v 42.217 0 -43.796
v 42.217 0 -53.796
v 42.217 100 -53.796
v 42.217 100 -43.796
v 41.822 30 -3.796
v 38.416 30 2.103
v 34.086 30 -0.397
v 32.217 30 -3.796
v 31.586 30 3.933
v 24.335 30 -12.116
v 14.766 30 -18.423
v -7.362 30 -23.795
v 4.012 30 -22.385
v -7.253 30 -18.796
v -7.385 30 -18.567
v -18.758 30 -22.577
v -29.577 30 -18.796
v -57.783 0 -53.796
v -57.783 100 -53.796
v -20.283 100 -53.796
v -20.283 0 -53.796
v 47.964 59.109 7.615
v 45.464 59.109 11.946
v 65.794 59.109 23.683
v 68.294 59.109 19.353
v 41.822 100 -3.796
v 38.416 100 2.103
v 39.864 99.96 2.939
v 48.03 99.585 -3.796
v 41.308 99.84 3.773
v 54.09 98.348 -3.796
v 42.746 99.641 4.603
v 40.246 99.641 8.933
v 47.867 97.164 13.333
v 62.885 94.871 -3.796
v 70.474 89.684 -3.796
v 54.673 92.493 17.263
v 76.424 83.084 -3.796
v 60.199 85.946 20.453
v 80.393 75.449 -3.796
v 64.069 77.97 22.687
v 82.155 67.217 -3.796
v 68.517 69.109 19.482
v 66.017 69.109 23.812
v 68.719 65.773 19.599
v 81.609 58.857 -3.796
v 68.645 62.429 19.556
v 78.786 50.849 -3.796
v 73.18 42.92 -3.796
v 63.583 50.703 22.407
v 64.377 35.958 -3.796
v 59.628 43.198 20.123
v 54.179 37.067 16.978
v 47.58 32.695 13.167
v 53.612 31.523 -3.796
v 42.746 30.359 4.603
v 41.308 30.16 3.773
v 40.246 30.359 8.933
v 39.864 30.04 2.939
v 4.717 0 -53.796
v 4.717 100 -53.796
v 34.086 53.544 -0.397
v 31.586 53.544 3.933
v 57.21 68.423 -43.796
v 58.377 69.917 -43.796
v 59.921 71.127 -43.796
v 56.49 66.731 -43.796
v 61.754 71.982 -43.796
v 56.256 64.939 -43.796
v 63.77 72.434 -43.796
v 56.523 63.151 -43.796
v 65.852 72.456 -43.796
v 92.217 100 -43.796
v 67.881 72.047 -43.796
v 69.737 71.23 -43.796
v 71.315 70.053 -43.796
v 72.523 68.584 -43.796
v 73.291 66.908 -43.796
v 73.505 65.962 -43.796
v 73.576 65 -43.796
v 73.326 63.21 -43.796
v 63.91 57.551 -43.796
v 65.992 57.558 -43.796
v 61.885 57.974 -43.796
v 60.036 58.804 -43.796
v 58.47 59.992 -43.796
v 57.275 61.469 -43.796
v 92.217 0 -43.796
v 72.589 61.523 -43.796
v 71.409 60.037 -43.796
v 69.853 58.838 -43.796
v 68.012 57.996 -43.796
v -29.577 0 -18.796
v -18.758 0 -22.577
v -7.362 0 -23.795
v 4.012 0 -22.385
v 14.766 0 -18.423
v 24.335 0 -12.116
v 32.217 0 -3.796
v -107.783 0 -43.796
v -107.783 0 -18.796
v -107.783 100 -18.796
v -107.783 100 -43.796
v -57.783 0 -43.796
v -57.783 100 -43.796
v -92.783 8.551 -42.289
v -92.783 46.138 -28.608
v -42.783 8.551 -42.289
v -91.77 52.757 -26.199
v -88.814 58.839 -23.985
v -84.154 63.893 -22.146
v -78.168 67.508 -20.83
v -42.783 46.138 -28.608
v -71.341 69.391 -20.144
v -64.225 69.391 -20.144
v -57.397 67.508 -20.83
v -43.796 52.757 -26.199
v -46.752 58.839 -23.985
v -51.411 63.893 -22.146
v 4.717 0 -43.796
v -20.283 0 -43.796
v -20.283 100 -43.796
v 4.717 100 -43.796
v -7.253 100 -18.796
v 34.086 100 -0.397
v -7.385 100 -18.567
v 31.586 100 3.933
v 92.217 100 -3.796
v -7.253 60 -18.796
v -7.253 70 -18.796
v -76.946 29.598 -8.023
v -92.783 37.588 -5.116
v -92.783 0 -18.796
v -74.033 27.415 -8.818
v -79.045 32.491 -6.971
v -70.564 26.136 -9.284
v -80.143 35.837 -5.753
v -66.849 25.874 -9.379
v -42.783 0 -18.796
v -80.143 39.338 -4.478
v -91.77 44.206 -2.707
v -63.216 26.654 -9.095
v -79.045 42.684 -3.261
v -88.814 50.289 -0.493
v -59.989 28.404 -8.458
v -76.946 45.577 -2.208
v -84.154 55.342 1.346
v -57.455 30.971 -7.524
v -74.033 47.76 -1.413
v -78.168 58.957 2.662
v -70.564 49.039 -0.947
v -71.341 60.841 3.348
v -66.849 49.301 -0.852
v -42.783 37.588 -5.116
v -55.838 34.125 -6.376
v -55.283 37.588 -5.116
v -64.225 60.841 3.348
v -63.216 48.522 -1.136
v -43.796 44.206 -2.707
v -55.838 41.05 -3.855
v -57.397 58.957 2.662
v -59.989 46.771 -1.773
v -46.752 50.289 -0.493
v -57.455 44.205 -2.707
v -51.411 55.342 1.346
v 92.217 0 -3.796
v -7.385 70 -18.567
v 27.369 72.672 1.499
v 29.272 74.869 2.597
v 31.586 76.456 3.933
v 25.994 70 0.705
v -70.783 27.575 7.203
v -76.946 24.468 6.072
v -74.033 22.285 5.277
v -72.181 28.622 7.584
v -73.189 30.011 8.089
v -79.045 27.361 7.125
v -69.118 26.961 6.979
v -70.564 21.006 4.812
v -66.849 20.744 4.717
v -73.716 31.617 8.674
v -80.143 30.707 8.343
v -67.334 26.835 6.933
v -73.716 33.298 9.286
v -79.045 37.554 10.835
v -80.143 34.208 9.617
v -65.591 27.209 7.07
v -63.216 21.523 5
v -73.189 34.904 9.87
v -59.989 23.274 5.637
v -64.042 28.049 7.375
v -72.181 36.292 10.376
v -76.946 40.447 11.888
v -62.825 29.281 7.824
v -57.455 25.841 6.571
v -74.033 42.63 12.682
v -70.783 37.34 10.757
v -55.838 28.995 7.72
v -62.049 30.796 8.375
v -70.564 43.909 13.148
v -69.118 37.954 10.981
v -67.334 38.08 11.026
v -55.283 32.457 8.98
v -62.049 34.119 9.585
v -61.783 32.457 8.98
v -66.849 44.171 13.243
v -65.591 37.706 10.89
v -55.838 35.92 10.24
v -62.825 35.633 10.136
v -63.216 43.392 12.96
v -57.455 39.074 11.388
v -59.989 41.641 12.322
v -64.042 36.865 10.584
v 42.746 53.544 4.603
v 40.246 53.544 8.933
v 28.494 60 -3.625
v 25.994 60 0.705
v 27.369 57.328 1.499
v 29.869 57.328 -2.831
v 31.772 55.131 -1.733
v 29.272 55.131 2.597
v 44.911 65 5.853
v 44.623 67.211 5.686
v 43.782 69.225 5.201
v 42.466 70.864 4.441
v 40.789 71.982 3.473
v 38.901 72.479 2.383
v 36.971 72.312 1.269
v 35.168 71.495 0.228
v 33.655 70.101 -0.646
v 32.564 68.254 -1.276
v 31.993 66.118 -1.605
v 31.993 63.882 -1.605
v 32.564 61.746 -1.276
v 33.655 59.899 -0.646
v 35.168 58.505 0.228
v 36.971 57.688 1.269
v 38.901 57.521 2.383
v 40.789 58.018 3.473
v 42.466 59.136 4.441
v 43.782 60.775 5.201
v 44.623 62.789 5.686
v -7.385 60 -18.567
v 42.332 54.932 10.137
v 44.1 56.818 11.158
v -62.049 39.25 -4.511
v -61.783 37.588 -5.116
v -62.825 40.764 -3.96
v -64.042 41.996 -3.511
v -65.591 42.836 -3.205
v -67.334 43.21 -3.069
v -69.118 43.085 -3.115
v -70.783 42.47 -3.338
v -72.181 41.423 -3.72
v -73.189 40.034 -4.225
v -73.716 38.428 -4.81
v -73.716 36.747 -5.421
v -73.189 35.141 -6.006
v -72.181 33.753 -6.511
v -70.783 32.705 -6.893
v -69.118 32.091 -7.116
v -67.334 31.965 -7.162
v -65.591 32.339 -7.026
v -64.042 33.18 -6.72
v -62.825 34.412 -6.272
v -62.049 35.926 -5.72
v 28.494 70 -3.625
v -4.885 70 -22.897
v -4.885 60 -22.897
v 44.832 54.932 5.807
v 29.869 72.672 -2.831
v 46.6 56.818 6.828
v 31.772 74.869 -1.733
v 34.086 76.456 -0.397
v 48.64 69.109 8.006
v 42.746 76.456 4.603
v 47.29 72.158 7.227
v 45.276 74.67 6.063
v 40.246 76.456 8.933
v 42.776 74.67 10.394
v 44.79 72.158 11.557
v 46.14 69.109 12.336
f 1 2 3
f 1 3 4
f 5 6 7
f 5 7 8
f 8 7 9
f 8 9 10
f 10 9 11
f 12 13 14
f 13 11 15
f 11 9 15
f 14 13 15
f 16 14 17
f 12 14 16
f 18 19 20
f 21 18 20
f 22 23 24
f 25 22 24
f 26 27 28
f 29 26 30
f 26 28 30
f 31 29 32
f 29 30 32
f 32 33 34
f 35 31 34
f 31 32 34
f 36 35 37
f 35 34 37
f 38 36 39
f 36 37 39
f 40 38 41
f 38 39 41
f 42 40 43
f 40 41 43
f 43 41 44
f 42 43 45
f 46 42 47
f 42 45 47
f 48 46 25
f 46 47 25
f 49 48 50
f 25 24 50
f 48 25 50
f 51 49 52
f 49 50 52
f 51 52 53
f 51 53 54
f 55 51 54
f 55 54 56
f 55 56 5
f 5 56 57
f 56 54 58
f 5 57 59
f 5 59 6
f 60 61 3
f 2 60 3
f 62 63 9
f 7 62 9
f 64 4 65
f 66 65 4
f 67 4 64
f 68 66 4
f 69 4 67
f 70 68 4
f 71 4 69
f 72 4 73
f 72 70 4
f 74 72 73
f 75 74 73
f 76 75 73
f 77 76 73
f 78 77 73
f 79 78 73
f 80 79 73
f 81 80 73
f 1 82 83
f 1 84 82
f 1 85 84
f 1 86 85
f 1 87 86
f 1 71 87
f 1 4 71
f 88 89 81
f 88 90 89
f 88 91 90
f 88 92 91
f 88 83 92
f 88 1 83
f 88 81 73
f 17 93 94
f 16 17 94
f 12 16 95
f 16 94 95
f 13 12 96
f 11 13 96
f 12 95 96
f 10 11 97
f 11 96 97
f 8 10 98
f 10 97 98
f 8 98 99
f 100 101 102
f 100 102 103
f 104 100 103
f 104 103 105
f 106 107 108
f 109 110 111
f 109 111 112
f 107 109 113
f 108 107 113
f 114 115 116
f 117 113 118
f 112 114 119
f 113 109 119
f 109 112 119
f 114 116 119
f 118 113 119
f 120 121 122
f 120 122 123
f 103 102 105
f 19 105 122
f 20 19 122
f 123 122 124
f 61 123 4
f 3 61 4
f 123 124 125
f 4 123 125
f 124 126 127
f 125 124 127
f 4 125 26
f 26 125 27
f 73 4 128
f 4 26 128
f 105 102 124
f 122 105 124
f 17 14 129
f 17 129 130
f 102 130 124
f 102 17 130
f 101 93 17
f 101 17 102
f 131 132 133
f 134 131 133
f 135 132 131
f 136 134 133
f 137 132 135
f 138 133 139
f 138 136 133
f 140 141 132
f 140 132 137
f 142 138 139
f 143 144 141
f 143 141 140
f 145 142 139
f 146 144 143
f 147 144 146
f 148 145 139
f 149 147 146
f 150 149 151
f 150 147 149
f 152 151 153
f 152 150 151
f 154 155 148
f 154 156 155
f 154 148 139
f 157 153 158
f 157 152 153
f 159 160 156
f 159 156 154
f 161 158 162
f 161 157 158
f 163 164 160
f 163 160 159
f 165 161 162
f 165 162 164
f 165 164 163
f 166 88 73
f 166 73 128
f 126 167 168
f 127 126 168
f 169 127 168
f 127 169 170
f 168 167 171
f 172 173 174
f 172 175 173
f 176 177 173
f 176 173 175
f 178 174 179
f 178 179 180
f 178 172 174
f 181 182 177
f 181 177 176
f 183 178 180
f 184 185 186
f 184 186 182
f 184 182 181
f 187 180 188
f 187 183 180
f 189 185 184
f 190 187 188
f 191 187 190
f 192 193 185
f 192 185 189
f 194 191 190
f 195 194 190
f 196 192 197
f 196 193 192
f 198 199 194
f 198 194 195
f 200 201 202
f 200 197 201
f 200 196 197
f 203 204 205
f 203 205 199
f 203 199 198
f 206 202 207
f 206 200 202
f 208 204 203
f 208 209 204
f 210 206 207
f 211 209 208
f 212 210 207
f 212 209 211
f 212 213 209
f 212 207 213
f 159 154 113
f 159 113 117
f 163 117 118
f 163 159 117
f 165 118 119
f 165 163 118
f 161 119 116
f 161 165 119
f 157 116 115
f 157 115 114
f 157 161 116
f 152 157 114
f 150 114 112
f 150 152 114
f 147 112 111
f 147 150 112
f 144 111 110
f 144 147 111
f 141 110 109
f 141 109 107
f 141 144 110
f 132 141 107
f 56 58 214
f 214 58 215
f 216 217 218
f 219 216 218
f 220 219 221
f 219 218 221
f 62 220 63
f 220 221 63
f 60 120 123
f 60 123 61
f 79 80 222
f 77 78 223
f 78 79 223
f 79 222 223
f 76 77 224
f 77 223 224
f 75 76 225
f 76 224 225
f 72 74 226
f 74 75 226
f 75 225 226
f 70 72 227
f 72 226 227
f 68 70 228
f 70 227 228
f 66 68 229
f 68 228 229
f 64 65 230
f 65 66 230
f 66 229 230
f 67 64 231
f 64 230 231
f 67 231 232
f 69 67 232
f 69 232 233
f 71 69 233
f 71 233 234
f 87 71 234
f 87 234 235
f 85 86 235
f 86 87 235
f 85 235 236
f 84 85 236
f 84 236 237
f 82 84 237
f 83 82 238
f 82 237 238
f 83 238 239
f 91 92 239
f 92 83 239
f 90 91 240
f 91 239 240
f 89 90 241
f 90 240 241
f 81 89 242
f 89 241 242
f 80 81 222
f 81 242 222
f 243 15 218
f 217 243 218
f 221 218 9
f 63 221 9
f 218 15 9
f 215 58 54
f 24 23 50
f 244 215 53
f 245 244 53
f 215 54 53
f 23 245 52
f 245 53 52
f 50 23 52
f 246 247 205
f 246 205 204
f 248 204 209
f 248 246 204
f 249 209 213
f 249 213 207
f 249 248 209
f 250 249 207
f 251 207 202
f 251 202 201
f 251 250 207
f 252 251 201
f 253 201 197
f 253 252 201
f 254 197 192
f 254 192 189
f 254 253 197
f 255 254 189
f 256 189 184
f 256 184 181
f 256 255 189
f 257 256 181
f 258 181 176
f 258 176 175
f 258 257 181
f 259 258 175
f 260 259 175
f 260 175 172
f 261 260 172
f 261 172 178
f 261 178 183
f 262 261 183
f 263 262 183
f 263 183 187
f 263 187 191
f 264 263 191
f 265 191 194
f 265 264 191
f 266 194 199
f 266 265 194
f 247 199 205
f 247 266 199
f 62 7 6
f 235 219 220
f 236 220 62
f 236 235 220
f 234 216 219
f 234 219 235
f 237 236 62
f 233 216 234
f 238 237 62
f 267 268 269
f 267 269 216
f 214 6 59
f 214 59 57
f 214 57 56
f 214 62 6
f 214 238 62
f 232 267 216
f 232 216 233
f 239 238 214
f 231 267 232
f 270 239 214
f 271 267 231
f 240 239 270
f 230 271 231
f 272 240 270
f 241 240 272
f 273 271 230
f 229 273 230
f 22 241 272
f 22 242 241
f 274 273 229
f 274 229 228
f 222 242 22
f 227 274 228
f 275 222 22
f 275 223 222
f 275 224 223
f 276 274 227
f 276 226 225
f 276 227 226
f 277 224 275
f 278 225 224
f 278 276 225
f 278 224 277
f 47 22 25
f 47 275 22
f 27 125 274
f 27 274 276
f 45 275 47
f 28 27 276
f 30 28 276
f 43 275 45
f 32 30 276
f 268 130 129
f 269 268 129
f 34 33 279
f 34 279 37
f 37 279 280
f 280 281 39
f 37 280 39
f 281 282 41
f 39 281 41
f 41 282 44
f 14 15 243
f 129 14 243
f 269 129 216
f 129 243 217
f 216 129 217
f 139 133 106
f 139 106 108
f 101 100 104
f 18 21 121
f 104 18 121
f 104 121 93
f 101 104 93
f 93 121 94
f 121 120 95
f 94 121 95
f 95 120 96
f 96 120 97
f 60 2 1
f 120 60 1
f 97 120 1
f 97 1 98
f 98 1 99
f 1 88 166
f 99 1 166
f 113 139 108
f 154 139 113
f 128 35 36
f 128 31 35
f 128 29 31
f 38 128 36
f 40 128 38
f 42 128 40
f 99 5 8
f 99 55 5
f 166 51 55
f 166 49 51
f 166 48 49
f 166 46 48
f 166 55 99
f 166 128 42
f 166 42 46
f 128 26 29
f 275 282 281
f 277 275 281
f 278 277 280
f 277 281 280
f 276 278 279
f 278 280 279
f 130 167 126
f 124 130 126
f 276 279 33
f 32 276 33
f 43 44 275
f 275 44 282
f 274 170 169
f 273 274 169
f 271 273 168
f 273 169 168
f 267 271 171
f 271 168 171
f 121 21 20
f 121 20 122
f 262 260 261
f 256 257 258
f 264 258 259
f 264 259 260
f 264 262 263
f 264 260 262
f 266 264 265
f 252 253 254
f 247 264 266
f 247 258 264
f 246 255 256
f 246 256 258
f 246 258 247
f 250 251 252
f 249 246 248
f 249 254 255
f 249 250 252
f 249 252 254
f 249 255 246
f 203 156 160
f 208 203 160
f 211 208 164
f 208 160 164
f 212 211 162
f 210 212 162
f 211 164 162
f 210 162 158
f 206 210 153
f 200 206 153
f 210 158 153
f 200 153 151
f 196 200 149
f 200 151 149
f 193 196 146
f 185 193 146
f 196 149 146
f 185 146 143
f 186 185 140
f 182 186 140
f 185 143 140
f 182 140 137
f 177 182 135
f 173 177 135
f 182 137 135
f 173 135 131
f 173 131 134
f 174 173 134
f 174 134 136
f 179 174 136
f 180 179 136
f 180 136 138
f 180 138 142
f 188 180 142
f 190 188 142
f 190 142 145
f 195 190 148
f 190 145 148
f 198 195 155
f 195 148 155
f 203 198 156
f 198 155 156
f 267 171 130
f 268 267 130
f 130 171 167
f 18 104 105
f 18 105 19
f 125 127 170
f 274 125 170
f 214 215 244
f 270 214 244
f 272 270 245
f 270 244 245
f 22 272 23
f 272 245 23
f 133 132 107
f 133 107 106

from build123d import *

# Parameters (mm, degrees)
F1_DEPTH  = 100
F4_DEPTH  = 25
F5_R      = 12.5
F5_R_2    = 6
F6_DEPTH  = 15
F11_R     = 7.5
F12_DEPTH = 80.3118891325
F14_DEPTH = 5
F15_W     = 30
F15_H     = 15
F16_DEPTH = 25
F17_R     = 50
F18_DEPTH = 30


with BuildPart() as f1:
    # F0 (on Front) → F1 (new body)
    with BuildSketch(Plane.XZ):
        Polygon((92.2171346843, -3.7963638455), (32.2171346843, -3.7963638455), (32.2171346843, -18.7963638455), (-107.7828653157, -18.7963638455), (-107.7828653157, -43.7963638455), (-57.7828653157, -43.7963638455), (-57.7828653157, -53.7963638455), (-20.2828653157, -53.7963638455), (-20.2828653157, -43.7963638455), (4.7171346843, -43.7963638455), (4.7171346843, -53.7963638455), (42.2171346843, -53.7963638455), (42.2171346843, -43.7963638455), (92.2171346843, -43.7963638455), align=None)
    extrude(amount=-F1_DEPTH)

    # F9 (on line) → F10 (join, up to the next surface of F1)
    with BuildSketch(Plane(origin=(6.1933479656, 0, -10.7271933453), x_dir=(0.8660254038, 0, 0.5), z_dir=(0.5, 0, -0.8660254038))):
        with BuildLine():
            Line((-15.679365024, -30), (-15.679365024, -100))
            Line((-15.679365024, -100), (34.320634976, -100))
            ThreePointArc((34.320634976, -100), (69.320634976, -65), (34.320634976, -30))
            Line((34.320634976, -30), (-15.679365024, -30))
        make_face()
    extrude(until=Until.NEXT)

    # F11 (on face) → F12 (cut, through all)
    with BuildSketch(Plane(origin=(6.1933479656, 0, -10.7271933453), x_dir=(0.8660254038, 0, 0.5), z_dir=(-0.5, 0, 0.8660254038))):
        with Locations((34.320634976, 65)):
            Circle(F11_R)
    extrude(amount=-F12_DEPTH, mode=Mode.SUBTRACT)

    # F13 (on face) → F14 (cut)
    with BuildSketch(Plane(origin=(6.1933479656, 0, -10.7271933453), x_dir=(0.8660254038, 0, 0.5), z_dir=(-0.5, 0, 0.8660254038))):
        with BuildLine():
            Line((39.320634976, 26.4404322952), (39.320634976, 53.5435607626))
            ThreePointArc((39.320634976, 53.5435607626), (42.8025598424, 55.818118354), (45.3455064204, 59.1091418592))
            Line((45.3455064204, 59.1091418592), (72.9986197077, 59.1091418592))
            Line((72.9986197077, 59.1091418592), (73.2159018517, 69.1091418266))
            Line((73.2159018517, 69.1091418266), (46.1259284264, 69.1091418266))
            ThreePointArc((46.1259284264, 69.1091418266), (43.4912492847, 73.4941057917), (39.320634976, 76.4564392374))
            Line((39.320634976, 76.4564392374), (39.320634976, 103.0133664608))
            Line((39.320634976, 103.0133664608), (29.320634976, 103.0133664608))
            Line((29.320634976, 103.0133664608), (29.320634976, 76.4564392374))
            ThreePointArc((29.320634976, 76.4564392374), (25.4818002112, 73.8388347648), (22.8641957386, 70))
            Line((22.8641957386, 70), (-15.679365024, 70))
            Line((-15.679365024, 70), (-15.679365024, 60))
            Line((-15.679365024, 60), (22.8641957386, 60))
            ThreePointArc((22.8641957386, 60), (25.4818002112, 56.1611652352), (29.320634976, 53.5435607626))
            Line((29.320634976, 53.5435607626), (29.320634976, 26.4404322952))
            Line((29.320634976, 26.4404322952), (39.320634976, 26.4404322952))
        make_face()
    extrude(amount=-F14_DEPTH, mode=Mode.SUBTRACT)

    # F15 (on face) → F16 (join)
    with BuildSketch(Plane(origin=(32.2171346843, 0, 0), x_dir=(0, -1, 0), z_dir=(-1, 0, 0))):
        with Locations((-15, -11.2963638455)):
            Rectangle(F15_W, F15_H)
    extrude(amount=F16_DEPTH)

    # F17 (on face) → F18 (cut, through all)
    with BuildSketch(Plane.XZ):
        with Locations((-7.7828653157, 26.2036361545)):
            Circle(F17_R)
    extrude(amount=-F18_DEPTH, mode=Mode.SUBTRACT)


with BuildPart() as f4:
    # F3 (on face) → F4 (new body)
    with BuildSketch(Plane(origin=(0, 6.0410348935, -16.5976069601), x_dir=(1, 0, 0), z_dir=(0, -0.3420201433, 0.9396926208))):
        with BuildLine():
            Line((-92.7828653157, 33.5712649436), (-92.7828653157, -6.4287350564))
            Line((-92.7828653157, -6.4287350564), (-42.7828653157, -6.4287350564))
            Line((-42.7828653157, -6.4287350564), (-42.7828653157, 33.5712649436))
            ThreePointArc((-42.7828653157, 33.5712649436), (-67.7828653157, 58.5712649436), (-92.7828653157, 33.5712649436))
        make_face()
    extrude(amount=-F4_DEPTH)

    # F5 (on face) → F6 (join)
    with BuildSketch(Plane(origin=(0, 6.0410348935, -16.5976069601), x_dir=(1, 0, 0), z_dir=(0, -0.3420201433, 0.9396926208))):
        with Locations((-67.7828653157, 33.5712649436)):
            Circle(F5_R)
        with Locations((-67.7828653157, 33.5712649436)):
            Circle(F5_R_2, mode=Mode.SUBTRACT)
    extrude(amount=F6_DEPTH)


solid = Compound([f1.part, f4.part])
